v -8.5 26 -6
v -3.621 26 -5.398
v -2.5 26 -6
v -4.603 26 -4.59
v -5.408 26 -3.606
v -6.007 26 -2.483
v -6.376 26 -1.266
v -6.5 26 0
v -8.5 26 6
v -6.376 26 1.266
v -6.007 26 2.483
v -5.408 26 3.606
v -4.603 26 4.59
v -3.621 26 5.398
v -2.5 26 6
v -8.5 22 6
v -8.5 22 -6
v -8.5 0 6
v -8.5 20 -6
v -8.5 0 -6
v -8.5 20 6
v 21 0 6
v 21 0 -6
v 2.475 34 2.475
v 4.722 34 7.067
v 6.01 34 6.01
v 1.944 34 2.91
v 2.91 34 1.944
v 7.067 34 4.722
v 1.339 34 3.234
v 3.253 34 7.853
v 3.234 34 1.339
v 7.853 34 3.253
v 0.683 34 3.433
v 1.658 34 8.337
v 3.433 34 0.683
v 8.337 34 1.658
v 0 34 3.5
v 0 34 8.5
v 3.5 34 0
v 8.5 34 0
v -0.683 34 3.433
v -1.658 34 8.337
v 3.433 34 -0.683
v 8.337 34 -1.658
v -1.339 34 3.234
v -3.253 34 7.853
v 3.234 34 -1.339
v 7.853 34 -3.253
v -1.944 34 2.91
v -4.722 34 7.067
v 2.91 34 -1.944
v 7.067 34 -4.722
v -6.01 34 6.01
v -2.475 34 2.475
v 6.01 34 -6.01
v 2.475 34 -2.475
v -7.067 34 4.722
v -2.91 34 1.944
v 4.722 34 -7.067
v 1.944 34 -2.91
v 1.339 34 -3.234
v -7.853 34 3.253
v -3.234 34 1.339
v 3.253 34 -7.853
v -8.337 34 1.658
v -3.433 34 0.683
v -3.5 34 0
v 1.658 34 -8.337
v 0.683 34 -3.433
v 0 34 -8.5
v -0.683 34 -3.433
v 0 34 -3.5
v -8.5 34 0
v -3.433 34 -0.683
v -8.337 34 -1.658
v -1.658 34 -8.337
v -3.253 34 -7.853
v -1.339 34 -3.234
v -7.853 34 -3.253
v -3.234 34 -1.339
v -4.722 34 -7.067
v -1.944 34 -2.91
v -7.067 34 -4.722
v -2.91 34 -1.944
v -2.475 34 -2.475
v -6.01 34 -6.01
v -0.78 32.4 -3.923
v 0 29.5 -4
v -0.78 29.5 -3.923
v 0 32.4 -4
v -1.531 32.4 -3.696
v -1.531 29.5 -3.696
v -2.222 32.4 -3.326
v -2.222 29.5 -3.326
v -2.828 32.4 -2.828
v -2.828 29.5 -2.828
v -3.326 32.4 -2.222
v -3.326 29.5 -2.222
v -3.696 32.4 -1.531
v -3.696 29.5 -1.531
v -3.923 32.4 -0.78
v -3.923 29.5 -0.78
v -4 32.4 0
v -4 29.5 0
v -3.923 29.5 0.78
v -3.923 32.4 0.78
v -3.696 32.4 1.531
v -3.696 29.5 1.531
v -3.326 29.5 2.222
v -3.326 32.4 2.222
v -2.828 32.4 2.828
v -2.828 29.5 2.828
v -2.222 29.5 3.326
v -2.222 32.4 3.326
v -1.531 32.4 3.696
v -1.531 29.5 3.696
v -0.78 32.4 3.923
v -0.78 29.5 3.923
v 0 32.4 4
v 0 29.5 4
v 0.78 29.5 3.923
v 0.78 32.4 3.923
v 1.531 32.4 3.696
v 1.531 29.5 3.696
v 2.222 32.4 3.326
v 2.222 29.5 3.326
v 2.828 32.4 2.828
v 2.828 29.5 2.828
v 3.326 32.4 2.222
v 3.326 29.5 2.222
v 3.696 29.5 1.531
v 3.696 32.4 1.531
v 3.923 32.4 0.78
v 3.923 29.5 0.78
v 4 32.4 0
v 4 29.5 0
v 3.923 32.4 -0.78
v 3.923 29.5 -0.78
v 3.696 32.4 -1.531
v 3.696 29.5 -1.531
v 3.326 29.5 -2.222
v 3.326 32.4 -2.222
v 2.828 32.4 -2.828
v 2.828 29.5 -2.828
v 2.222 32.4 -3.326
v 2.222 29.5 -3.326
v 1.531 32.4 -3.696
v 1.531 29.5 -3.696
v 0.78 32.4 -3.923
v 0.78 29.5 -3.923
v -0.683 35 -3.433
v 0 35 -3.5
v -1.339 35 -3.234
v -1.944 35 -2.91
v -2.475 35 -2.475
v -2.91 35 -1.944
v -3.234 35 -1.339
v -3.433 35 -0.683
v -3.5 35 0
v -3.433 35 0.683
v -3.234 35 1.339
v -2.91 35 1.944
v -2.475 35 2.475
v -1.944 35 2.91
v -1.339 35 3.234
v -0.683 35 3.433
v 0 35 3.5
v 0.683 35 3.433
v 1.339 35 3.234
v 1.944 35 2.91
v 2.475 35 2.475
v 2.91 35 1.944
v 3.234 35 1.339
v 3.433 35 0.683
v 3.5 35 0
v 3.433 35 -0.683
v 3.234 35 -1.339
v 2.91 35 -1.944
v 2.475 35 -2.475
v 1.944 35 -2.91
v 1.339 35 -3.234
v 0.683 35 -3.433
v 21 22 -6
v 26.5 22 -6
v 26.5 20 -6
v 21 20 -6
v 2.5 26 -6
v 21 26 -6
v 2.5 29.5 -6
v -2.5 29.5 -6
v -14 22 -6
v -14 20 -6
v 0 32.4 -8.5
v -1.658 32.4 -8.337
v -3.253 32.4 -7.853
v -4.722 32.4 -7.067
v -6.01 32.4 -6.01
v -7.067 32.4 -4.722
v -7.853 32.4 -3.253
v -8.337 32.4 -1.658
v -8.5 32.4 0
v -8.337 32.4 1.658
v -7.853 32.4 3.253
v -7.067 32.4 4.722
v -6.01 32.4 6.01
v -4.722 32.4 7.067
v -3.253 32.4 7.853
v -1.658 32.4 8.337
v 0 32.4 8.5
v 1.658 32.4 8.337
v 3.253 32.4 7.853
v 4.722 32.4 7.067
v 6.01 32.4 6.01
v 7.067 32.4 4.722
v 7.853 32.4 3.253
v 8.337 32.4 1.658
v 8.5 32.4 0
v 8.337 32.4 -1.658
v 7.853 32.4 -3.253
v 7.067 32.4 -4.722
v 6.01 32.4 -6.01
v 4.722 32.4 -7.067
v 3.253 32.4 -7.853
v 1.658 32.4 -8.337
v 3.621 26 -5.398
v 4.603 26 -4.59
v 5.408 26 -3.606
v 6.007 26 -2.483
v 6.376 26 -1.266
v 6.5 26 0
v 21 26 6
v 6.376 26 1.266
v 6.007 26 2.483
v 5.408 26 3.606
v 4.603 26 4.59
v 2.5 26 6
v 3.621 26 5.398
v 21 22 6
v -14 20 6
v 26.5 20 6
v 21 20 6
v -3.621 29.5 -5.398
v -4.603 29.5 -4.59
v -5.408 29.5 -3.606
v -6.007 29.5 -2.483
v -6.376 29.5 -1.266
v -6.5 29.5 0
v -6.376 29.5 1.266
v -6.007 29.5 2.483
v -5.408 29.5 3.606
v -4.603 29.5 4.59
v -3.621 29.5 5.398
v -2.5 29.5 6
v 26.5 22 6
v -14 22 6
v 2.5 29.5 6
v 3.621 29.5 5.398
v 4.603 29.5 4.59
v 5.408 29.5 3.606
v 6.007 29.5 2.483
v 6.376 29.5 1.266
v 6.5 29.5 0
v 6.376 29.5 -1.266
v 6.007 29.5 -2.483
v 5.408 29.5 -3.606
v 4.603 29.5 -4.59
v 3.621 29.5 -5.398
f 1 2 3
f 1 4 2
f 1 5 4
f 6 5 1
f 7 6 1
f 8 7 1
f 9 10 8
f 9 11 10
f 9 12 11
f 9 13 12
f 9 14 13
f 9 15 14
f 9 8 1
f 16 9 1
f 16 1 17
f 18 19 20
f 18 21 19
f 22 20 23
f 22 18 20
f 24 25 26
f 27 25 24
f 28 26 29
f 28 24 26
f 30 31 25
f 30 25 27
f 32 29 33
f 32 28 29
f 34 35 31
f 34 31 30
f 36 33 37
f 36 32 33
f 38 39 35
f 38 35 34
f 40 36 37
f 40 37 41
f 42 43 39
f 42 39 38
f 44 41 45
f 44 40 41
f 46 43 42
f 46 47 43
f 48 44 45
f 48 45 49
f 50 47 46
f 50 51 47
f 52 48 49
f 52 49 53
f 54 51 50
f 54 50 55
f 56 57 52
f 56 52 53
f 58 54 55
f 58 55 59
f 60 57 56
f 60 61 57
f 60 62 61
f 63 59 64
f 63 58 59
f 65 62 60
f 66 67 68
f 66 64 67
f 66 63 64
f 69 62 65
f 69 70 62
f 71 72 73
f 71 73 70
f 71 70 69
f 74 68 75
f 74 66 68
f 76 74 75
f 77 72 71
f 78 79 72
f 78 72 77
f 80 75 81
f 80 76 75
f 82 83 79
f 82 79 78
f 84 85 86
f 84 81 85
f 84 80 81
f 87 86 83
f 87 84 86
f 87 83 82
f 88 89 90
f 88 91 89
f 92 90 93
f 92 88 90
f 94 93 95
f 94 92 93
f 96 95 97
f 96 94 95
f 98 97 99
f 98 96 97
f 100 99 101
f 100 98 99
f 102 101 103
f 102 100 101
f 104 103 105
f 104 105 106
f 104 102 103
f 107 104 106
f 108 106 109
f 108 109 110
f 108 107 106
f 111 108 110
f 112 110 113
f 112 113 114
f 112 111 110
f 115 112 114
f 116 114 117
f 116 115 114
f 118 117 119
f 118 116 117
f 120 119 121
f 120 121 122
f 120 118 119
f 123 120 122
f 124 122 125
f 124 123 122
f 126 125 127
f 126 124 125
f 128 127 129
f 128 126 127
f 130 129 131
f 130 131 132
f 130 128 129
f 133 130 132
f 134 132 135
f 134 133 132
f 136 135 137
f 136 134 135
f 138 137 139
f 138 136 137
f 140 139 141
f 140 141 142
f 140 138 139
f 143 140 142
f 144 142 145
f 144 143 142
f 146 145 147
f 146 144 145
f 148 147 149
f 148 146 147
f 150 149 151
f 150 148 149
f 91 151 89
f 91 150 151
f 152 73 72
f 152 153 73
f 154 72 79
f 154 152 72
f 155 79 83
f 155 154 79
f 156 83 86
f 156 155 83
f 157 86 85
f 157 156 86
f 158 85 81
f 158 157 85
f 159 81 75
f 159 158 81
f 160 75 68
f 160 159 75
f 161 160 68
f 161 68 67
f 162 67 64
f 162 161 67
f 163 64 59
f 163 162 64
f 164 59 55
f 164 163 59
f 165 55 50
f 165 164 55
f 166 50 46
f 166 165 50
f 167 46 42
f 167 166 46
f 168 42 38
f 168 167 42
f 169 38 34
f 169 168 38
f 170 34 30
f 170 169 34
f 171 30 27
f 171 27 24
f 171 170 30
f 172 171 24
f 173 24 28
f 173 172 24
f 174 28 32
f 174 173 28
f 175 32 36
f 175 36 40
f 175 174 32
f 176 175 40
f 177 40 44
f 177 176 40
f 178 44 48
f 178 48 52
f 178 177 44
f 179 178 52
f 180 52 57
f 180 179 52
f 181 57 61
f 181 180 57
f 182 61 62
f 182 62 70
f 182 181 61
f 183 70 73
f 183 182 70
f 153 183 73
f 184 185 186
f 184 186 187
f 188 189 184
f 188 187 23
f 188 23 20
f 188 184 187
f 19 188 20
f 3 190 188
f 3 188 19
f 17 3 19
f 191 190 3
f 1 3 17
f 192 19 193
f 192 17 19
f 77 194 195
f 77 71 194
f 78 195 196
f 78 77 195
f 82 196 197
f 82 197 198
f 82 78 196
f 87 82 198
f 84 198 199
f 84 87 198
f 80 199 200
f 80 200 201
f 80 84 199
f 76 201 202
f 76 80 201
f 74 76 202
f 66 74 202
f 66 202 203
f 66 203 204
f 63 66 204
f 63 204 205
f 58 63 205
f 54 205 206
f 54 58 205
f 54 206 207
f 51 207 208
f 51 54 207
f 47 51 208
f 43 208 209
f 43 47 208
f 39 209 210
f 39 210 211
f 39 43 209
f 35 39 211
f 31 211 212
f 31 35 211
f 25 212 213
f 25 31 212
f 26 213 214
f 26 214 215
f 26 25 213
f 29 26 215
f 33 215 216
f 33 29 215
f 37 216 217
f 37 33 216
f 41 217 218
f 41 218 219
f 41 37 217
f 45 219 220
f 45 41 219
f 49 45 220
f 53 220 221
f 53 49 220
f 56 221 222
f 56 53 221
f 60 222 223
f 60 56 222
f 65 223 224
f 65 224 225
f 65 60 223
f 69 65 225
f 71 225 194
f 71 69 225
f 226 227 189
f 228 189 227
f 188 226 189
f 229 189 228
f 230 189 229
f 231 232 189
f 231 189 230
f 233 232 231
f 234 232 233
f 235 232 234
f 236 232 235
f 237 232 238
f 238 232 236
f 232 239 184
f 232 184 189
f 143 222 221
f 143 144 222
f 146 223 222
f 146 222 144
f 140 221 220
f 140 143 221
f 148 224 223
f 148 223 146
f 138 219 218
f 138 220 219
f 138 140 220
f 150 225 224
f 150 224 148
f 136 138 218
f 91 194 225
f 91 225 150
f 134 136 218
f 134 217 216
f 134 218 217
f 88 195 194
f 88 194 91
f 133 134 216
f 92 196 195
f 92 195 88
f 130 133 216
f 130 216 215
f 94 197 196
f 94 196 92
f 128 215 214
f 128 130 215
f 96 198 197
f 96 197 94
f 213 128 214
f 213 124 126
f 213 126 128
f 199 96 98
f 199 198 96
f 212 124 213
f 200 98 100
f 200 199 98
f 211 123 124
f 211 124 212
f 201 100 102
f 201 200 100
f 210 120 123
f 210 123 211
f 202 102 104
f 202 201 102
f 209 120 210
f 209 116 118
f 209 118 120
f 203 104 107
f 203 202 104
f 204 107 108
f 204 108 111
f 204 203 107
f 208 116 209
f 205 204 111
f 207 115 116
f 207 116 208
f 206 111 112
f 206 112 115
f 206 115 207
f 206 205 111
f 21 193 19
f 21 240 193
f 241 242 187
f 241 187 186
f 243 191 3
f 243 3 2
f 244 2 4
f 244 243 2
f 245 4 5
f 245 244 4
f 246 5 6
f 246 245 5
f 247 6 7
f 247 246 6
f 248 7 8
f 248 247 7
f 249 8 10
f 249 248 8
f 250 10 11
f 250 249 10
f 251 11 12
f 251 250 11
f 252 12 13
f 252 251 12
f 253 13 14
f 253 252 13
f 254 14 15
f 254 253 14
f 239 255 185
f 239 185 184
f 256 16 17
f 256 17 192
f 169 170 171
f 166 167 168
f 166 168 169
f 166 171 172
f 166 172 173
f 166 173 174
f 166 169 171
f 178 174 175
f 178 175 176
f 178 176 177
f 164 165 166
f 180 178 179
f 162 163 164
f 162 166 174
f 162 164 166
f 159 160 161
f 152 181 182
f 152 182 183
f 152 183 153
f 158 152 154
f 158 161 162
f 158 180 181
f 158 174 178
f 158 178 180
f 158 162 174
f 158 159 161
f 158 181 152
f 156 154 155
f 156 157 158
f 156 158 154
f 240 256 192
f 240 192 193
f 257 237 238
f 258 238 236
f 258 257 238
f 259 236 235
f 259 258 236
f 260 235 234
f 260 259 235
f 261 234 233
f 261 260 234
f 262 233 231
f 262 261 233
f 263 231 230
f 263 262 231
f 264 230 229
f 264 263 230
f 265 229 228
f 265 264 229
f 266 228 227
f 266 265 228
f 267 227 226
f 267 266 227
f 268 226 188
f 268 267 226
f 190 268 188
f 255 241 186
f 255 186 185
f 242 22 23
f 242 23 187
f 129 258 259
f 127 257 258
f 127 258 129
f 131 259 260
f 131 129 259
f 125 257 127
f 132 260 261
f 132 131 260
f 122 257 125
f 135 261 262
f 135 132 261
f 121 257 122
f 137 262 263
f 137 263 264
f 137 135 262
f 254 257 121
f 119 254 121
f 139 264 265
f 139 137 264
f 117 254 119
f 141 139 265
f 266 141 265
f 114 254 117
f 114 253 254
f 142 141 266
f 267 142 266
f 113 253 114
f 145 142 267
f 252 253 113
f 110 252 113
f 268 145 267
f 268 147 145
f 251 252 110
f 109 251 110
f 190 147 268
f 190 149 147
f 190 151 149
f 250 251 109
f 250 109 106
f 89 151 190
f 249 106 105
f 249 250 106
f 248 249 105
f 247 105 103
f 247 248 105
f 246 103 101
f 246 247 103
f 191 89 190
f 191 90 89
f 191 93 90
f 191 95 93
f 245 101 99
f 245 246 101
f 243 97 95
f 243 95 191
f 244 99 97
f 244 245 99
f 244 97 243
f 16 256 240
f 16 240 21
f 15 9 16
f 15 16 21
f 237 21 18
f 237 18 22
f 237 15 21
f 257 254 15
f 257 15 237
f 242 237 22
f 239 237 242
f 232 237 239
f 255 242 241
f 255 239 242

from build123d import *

# Parameters (mm, degrees)
VYSUNOUT1_DEPTH          = 6
ODEBRAT_START            = -29.5
ODEBRAT_VYSUNUT_M2_DEPTH = 3.5


# Read off the part's stored shape, not the designer's step: Odebrat vysunutím2
with BuildPart() as part:
    # Skica1 → Vysunout1 (new, symmetric)
    with BuildSketch(Plane.XY):
        Polygon((-8.5, 0), (21, 0), (21, 20), (26.5, 20), (26.5, 22), (21, 22), (21, 26), (-8.5, 26), (-8.5, 22), (-14, 22), (-14, 20), (-8.5, 20), align=None)
    extrude(amount=VYSUNOUT1_DEPTH, both=True)

    # Skica2 → Rotovat1 (revolve)
    with BuildSketch(Plane.XY, mode=Mode.PRIVATE) as rotovat1_sk:
        Polygon((-6.5, 26), (-6.5, 29.5), (-4, 29.5), (-4, 32.4), (-8.5, 32.4), (-8.5, 34), (-3.5, 34), (-3.5, 35), (0, 35), (0, 26), align=None)
    revolve(rotovat1_sk.sketch.rotate(Axis((0, 0, 0), (0, 1, 0)), 270), axis=Axis((0, 0, 0), (0, 1, 0)))

    # Odebrat vysunutím2 outline → Odebrat vysunutím2 (cut)
    with BuildSketch(Plane.XZ.offset(ODEBRAT_START)):
        with BuildLine():
            Line((-2.5, 6), (2.5, 6))
            ThreePointArc((2.5, 6), (0, 6.5), (-2.5, 6))
        make_face()
        with BuildLine():
            Line((2.5, -6), (-2.5, -6))
            ThreePointArc((-2.5, -6), (0, -6.5), (2.5, -6))
        make_face()
    extrude(amount=ODEBRAT_VYSUNUT_M2_DEPTH, mode=Mode.SUBTRACT)


solid = part.part
